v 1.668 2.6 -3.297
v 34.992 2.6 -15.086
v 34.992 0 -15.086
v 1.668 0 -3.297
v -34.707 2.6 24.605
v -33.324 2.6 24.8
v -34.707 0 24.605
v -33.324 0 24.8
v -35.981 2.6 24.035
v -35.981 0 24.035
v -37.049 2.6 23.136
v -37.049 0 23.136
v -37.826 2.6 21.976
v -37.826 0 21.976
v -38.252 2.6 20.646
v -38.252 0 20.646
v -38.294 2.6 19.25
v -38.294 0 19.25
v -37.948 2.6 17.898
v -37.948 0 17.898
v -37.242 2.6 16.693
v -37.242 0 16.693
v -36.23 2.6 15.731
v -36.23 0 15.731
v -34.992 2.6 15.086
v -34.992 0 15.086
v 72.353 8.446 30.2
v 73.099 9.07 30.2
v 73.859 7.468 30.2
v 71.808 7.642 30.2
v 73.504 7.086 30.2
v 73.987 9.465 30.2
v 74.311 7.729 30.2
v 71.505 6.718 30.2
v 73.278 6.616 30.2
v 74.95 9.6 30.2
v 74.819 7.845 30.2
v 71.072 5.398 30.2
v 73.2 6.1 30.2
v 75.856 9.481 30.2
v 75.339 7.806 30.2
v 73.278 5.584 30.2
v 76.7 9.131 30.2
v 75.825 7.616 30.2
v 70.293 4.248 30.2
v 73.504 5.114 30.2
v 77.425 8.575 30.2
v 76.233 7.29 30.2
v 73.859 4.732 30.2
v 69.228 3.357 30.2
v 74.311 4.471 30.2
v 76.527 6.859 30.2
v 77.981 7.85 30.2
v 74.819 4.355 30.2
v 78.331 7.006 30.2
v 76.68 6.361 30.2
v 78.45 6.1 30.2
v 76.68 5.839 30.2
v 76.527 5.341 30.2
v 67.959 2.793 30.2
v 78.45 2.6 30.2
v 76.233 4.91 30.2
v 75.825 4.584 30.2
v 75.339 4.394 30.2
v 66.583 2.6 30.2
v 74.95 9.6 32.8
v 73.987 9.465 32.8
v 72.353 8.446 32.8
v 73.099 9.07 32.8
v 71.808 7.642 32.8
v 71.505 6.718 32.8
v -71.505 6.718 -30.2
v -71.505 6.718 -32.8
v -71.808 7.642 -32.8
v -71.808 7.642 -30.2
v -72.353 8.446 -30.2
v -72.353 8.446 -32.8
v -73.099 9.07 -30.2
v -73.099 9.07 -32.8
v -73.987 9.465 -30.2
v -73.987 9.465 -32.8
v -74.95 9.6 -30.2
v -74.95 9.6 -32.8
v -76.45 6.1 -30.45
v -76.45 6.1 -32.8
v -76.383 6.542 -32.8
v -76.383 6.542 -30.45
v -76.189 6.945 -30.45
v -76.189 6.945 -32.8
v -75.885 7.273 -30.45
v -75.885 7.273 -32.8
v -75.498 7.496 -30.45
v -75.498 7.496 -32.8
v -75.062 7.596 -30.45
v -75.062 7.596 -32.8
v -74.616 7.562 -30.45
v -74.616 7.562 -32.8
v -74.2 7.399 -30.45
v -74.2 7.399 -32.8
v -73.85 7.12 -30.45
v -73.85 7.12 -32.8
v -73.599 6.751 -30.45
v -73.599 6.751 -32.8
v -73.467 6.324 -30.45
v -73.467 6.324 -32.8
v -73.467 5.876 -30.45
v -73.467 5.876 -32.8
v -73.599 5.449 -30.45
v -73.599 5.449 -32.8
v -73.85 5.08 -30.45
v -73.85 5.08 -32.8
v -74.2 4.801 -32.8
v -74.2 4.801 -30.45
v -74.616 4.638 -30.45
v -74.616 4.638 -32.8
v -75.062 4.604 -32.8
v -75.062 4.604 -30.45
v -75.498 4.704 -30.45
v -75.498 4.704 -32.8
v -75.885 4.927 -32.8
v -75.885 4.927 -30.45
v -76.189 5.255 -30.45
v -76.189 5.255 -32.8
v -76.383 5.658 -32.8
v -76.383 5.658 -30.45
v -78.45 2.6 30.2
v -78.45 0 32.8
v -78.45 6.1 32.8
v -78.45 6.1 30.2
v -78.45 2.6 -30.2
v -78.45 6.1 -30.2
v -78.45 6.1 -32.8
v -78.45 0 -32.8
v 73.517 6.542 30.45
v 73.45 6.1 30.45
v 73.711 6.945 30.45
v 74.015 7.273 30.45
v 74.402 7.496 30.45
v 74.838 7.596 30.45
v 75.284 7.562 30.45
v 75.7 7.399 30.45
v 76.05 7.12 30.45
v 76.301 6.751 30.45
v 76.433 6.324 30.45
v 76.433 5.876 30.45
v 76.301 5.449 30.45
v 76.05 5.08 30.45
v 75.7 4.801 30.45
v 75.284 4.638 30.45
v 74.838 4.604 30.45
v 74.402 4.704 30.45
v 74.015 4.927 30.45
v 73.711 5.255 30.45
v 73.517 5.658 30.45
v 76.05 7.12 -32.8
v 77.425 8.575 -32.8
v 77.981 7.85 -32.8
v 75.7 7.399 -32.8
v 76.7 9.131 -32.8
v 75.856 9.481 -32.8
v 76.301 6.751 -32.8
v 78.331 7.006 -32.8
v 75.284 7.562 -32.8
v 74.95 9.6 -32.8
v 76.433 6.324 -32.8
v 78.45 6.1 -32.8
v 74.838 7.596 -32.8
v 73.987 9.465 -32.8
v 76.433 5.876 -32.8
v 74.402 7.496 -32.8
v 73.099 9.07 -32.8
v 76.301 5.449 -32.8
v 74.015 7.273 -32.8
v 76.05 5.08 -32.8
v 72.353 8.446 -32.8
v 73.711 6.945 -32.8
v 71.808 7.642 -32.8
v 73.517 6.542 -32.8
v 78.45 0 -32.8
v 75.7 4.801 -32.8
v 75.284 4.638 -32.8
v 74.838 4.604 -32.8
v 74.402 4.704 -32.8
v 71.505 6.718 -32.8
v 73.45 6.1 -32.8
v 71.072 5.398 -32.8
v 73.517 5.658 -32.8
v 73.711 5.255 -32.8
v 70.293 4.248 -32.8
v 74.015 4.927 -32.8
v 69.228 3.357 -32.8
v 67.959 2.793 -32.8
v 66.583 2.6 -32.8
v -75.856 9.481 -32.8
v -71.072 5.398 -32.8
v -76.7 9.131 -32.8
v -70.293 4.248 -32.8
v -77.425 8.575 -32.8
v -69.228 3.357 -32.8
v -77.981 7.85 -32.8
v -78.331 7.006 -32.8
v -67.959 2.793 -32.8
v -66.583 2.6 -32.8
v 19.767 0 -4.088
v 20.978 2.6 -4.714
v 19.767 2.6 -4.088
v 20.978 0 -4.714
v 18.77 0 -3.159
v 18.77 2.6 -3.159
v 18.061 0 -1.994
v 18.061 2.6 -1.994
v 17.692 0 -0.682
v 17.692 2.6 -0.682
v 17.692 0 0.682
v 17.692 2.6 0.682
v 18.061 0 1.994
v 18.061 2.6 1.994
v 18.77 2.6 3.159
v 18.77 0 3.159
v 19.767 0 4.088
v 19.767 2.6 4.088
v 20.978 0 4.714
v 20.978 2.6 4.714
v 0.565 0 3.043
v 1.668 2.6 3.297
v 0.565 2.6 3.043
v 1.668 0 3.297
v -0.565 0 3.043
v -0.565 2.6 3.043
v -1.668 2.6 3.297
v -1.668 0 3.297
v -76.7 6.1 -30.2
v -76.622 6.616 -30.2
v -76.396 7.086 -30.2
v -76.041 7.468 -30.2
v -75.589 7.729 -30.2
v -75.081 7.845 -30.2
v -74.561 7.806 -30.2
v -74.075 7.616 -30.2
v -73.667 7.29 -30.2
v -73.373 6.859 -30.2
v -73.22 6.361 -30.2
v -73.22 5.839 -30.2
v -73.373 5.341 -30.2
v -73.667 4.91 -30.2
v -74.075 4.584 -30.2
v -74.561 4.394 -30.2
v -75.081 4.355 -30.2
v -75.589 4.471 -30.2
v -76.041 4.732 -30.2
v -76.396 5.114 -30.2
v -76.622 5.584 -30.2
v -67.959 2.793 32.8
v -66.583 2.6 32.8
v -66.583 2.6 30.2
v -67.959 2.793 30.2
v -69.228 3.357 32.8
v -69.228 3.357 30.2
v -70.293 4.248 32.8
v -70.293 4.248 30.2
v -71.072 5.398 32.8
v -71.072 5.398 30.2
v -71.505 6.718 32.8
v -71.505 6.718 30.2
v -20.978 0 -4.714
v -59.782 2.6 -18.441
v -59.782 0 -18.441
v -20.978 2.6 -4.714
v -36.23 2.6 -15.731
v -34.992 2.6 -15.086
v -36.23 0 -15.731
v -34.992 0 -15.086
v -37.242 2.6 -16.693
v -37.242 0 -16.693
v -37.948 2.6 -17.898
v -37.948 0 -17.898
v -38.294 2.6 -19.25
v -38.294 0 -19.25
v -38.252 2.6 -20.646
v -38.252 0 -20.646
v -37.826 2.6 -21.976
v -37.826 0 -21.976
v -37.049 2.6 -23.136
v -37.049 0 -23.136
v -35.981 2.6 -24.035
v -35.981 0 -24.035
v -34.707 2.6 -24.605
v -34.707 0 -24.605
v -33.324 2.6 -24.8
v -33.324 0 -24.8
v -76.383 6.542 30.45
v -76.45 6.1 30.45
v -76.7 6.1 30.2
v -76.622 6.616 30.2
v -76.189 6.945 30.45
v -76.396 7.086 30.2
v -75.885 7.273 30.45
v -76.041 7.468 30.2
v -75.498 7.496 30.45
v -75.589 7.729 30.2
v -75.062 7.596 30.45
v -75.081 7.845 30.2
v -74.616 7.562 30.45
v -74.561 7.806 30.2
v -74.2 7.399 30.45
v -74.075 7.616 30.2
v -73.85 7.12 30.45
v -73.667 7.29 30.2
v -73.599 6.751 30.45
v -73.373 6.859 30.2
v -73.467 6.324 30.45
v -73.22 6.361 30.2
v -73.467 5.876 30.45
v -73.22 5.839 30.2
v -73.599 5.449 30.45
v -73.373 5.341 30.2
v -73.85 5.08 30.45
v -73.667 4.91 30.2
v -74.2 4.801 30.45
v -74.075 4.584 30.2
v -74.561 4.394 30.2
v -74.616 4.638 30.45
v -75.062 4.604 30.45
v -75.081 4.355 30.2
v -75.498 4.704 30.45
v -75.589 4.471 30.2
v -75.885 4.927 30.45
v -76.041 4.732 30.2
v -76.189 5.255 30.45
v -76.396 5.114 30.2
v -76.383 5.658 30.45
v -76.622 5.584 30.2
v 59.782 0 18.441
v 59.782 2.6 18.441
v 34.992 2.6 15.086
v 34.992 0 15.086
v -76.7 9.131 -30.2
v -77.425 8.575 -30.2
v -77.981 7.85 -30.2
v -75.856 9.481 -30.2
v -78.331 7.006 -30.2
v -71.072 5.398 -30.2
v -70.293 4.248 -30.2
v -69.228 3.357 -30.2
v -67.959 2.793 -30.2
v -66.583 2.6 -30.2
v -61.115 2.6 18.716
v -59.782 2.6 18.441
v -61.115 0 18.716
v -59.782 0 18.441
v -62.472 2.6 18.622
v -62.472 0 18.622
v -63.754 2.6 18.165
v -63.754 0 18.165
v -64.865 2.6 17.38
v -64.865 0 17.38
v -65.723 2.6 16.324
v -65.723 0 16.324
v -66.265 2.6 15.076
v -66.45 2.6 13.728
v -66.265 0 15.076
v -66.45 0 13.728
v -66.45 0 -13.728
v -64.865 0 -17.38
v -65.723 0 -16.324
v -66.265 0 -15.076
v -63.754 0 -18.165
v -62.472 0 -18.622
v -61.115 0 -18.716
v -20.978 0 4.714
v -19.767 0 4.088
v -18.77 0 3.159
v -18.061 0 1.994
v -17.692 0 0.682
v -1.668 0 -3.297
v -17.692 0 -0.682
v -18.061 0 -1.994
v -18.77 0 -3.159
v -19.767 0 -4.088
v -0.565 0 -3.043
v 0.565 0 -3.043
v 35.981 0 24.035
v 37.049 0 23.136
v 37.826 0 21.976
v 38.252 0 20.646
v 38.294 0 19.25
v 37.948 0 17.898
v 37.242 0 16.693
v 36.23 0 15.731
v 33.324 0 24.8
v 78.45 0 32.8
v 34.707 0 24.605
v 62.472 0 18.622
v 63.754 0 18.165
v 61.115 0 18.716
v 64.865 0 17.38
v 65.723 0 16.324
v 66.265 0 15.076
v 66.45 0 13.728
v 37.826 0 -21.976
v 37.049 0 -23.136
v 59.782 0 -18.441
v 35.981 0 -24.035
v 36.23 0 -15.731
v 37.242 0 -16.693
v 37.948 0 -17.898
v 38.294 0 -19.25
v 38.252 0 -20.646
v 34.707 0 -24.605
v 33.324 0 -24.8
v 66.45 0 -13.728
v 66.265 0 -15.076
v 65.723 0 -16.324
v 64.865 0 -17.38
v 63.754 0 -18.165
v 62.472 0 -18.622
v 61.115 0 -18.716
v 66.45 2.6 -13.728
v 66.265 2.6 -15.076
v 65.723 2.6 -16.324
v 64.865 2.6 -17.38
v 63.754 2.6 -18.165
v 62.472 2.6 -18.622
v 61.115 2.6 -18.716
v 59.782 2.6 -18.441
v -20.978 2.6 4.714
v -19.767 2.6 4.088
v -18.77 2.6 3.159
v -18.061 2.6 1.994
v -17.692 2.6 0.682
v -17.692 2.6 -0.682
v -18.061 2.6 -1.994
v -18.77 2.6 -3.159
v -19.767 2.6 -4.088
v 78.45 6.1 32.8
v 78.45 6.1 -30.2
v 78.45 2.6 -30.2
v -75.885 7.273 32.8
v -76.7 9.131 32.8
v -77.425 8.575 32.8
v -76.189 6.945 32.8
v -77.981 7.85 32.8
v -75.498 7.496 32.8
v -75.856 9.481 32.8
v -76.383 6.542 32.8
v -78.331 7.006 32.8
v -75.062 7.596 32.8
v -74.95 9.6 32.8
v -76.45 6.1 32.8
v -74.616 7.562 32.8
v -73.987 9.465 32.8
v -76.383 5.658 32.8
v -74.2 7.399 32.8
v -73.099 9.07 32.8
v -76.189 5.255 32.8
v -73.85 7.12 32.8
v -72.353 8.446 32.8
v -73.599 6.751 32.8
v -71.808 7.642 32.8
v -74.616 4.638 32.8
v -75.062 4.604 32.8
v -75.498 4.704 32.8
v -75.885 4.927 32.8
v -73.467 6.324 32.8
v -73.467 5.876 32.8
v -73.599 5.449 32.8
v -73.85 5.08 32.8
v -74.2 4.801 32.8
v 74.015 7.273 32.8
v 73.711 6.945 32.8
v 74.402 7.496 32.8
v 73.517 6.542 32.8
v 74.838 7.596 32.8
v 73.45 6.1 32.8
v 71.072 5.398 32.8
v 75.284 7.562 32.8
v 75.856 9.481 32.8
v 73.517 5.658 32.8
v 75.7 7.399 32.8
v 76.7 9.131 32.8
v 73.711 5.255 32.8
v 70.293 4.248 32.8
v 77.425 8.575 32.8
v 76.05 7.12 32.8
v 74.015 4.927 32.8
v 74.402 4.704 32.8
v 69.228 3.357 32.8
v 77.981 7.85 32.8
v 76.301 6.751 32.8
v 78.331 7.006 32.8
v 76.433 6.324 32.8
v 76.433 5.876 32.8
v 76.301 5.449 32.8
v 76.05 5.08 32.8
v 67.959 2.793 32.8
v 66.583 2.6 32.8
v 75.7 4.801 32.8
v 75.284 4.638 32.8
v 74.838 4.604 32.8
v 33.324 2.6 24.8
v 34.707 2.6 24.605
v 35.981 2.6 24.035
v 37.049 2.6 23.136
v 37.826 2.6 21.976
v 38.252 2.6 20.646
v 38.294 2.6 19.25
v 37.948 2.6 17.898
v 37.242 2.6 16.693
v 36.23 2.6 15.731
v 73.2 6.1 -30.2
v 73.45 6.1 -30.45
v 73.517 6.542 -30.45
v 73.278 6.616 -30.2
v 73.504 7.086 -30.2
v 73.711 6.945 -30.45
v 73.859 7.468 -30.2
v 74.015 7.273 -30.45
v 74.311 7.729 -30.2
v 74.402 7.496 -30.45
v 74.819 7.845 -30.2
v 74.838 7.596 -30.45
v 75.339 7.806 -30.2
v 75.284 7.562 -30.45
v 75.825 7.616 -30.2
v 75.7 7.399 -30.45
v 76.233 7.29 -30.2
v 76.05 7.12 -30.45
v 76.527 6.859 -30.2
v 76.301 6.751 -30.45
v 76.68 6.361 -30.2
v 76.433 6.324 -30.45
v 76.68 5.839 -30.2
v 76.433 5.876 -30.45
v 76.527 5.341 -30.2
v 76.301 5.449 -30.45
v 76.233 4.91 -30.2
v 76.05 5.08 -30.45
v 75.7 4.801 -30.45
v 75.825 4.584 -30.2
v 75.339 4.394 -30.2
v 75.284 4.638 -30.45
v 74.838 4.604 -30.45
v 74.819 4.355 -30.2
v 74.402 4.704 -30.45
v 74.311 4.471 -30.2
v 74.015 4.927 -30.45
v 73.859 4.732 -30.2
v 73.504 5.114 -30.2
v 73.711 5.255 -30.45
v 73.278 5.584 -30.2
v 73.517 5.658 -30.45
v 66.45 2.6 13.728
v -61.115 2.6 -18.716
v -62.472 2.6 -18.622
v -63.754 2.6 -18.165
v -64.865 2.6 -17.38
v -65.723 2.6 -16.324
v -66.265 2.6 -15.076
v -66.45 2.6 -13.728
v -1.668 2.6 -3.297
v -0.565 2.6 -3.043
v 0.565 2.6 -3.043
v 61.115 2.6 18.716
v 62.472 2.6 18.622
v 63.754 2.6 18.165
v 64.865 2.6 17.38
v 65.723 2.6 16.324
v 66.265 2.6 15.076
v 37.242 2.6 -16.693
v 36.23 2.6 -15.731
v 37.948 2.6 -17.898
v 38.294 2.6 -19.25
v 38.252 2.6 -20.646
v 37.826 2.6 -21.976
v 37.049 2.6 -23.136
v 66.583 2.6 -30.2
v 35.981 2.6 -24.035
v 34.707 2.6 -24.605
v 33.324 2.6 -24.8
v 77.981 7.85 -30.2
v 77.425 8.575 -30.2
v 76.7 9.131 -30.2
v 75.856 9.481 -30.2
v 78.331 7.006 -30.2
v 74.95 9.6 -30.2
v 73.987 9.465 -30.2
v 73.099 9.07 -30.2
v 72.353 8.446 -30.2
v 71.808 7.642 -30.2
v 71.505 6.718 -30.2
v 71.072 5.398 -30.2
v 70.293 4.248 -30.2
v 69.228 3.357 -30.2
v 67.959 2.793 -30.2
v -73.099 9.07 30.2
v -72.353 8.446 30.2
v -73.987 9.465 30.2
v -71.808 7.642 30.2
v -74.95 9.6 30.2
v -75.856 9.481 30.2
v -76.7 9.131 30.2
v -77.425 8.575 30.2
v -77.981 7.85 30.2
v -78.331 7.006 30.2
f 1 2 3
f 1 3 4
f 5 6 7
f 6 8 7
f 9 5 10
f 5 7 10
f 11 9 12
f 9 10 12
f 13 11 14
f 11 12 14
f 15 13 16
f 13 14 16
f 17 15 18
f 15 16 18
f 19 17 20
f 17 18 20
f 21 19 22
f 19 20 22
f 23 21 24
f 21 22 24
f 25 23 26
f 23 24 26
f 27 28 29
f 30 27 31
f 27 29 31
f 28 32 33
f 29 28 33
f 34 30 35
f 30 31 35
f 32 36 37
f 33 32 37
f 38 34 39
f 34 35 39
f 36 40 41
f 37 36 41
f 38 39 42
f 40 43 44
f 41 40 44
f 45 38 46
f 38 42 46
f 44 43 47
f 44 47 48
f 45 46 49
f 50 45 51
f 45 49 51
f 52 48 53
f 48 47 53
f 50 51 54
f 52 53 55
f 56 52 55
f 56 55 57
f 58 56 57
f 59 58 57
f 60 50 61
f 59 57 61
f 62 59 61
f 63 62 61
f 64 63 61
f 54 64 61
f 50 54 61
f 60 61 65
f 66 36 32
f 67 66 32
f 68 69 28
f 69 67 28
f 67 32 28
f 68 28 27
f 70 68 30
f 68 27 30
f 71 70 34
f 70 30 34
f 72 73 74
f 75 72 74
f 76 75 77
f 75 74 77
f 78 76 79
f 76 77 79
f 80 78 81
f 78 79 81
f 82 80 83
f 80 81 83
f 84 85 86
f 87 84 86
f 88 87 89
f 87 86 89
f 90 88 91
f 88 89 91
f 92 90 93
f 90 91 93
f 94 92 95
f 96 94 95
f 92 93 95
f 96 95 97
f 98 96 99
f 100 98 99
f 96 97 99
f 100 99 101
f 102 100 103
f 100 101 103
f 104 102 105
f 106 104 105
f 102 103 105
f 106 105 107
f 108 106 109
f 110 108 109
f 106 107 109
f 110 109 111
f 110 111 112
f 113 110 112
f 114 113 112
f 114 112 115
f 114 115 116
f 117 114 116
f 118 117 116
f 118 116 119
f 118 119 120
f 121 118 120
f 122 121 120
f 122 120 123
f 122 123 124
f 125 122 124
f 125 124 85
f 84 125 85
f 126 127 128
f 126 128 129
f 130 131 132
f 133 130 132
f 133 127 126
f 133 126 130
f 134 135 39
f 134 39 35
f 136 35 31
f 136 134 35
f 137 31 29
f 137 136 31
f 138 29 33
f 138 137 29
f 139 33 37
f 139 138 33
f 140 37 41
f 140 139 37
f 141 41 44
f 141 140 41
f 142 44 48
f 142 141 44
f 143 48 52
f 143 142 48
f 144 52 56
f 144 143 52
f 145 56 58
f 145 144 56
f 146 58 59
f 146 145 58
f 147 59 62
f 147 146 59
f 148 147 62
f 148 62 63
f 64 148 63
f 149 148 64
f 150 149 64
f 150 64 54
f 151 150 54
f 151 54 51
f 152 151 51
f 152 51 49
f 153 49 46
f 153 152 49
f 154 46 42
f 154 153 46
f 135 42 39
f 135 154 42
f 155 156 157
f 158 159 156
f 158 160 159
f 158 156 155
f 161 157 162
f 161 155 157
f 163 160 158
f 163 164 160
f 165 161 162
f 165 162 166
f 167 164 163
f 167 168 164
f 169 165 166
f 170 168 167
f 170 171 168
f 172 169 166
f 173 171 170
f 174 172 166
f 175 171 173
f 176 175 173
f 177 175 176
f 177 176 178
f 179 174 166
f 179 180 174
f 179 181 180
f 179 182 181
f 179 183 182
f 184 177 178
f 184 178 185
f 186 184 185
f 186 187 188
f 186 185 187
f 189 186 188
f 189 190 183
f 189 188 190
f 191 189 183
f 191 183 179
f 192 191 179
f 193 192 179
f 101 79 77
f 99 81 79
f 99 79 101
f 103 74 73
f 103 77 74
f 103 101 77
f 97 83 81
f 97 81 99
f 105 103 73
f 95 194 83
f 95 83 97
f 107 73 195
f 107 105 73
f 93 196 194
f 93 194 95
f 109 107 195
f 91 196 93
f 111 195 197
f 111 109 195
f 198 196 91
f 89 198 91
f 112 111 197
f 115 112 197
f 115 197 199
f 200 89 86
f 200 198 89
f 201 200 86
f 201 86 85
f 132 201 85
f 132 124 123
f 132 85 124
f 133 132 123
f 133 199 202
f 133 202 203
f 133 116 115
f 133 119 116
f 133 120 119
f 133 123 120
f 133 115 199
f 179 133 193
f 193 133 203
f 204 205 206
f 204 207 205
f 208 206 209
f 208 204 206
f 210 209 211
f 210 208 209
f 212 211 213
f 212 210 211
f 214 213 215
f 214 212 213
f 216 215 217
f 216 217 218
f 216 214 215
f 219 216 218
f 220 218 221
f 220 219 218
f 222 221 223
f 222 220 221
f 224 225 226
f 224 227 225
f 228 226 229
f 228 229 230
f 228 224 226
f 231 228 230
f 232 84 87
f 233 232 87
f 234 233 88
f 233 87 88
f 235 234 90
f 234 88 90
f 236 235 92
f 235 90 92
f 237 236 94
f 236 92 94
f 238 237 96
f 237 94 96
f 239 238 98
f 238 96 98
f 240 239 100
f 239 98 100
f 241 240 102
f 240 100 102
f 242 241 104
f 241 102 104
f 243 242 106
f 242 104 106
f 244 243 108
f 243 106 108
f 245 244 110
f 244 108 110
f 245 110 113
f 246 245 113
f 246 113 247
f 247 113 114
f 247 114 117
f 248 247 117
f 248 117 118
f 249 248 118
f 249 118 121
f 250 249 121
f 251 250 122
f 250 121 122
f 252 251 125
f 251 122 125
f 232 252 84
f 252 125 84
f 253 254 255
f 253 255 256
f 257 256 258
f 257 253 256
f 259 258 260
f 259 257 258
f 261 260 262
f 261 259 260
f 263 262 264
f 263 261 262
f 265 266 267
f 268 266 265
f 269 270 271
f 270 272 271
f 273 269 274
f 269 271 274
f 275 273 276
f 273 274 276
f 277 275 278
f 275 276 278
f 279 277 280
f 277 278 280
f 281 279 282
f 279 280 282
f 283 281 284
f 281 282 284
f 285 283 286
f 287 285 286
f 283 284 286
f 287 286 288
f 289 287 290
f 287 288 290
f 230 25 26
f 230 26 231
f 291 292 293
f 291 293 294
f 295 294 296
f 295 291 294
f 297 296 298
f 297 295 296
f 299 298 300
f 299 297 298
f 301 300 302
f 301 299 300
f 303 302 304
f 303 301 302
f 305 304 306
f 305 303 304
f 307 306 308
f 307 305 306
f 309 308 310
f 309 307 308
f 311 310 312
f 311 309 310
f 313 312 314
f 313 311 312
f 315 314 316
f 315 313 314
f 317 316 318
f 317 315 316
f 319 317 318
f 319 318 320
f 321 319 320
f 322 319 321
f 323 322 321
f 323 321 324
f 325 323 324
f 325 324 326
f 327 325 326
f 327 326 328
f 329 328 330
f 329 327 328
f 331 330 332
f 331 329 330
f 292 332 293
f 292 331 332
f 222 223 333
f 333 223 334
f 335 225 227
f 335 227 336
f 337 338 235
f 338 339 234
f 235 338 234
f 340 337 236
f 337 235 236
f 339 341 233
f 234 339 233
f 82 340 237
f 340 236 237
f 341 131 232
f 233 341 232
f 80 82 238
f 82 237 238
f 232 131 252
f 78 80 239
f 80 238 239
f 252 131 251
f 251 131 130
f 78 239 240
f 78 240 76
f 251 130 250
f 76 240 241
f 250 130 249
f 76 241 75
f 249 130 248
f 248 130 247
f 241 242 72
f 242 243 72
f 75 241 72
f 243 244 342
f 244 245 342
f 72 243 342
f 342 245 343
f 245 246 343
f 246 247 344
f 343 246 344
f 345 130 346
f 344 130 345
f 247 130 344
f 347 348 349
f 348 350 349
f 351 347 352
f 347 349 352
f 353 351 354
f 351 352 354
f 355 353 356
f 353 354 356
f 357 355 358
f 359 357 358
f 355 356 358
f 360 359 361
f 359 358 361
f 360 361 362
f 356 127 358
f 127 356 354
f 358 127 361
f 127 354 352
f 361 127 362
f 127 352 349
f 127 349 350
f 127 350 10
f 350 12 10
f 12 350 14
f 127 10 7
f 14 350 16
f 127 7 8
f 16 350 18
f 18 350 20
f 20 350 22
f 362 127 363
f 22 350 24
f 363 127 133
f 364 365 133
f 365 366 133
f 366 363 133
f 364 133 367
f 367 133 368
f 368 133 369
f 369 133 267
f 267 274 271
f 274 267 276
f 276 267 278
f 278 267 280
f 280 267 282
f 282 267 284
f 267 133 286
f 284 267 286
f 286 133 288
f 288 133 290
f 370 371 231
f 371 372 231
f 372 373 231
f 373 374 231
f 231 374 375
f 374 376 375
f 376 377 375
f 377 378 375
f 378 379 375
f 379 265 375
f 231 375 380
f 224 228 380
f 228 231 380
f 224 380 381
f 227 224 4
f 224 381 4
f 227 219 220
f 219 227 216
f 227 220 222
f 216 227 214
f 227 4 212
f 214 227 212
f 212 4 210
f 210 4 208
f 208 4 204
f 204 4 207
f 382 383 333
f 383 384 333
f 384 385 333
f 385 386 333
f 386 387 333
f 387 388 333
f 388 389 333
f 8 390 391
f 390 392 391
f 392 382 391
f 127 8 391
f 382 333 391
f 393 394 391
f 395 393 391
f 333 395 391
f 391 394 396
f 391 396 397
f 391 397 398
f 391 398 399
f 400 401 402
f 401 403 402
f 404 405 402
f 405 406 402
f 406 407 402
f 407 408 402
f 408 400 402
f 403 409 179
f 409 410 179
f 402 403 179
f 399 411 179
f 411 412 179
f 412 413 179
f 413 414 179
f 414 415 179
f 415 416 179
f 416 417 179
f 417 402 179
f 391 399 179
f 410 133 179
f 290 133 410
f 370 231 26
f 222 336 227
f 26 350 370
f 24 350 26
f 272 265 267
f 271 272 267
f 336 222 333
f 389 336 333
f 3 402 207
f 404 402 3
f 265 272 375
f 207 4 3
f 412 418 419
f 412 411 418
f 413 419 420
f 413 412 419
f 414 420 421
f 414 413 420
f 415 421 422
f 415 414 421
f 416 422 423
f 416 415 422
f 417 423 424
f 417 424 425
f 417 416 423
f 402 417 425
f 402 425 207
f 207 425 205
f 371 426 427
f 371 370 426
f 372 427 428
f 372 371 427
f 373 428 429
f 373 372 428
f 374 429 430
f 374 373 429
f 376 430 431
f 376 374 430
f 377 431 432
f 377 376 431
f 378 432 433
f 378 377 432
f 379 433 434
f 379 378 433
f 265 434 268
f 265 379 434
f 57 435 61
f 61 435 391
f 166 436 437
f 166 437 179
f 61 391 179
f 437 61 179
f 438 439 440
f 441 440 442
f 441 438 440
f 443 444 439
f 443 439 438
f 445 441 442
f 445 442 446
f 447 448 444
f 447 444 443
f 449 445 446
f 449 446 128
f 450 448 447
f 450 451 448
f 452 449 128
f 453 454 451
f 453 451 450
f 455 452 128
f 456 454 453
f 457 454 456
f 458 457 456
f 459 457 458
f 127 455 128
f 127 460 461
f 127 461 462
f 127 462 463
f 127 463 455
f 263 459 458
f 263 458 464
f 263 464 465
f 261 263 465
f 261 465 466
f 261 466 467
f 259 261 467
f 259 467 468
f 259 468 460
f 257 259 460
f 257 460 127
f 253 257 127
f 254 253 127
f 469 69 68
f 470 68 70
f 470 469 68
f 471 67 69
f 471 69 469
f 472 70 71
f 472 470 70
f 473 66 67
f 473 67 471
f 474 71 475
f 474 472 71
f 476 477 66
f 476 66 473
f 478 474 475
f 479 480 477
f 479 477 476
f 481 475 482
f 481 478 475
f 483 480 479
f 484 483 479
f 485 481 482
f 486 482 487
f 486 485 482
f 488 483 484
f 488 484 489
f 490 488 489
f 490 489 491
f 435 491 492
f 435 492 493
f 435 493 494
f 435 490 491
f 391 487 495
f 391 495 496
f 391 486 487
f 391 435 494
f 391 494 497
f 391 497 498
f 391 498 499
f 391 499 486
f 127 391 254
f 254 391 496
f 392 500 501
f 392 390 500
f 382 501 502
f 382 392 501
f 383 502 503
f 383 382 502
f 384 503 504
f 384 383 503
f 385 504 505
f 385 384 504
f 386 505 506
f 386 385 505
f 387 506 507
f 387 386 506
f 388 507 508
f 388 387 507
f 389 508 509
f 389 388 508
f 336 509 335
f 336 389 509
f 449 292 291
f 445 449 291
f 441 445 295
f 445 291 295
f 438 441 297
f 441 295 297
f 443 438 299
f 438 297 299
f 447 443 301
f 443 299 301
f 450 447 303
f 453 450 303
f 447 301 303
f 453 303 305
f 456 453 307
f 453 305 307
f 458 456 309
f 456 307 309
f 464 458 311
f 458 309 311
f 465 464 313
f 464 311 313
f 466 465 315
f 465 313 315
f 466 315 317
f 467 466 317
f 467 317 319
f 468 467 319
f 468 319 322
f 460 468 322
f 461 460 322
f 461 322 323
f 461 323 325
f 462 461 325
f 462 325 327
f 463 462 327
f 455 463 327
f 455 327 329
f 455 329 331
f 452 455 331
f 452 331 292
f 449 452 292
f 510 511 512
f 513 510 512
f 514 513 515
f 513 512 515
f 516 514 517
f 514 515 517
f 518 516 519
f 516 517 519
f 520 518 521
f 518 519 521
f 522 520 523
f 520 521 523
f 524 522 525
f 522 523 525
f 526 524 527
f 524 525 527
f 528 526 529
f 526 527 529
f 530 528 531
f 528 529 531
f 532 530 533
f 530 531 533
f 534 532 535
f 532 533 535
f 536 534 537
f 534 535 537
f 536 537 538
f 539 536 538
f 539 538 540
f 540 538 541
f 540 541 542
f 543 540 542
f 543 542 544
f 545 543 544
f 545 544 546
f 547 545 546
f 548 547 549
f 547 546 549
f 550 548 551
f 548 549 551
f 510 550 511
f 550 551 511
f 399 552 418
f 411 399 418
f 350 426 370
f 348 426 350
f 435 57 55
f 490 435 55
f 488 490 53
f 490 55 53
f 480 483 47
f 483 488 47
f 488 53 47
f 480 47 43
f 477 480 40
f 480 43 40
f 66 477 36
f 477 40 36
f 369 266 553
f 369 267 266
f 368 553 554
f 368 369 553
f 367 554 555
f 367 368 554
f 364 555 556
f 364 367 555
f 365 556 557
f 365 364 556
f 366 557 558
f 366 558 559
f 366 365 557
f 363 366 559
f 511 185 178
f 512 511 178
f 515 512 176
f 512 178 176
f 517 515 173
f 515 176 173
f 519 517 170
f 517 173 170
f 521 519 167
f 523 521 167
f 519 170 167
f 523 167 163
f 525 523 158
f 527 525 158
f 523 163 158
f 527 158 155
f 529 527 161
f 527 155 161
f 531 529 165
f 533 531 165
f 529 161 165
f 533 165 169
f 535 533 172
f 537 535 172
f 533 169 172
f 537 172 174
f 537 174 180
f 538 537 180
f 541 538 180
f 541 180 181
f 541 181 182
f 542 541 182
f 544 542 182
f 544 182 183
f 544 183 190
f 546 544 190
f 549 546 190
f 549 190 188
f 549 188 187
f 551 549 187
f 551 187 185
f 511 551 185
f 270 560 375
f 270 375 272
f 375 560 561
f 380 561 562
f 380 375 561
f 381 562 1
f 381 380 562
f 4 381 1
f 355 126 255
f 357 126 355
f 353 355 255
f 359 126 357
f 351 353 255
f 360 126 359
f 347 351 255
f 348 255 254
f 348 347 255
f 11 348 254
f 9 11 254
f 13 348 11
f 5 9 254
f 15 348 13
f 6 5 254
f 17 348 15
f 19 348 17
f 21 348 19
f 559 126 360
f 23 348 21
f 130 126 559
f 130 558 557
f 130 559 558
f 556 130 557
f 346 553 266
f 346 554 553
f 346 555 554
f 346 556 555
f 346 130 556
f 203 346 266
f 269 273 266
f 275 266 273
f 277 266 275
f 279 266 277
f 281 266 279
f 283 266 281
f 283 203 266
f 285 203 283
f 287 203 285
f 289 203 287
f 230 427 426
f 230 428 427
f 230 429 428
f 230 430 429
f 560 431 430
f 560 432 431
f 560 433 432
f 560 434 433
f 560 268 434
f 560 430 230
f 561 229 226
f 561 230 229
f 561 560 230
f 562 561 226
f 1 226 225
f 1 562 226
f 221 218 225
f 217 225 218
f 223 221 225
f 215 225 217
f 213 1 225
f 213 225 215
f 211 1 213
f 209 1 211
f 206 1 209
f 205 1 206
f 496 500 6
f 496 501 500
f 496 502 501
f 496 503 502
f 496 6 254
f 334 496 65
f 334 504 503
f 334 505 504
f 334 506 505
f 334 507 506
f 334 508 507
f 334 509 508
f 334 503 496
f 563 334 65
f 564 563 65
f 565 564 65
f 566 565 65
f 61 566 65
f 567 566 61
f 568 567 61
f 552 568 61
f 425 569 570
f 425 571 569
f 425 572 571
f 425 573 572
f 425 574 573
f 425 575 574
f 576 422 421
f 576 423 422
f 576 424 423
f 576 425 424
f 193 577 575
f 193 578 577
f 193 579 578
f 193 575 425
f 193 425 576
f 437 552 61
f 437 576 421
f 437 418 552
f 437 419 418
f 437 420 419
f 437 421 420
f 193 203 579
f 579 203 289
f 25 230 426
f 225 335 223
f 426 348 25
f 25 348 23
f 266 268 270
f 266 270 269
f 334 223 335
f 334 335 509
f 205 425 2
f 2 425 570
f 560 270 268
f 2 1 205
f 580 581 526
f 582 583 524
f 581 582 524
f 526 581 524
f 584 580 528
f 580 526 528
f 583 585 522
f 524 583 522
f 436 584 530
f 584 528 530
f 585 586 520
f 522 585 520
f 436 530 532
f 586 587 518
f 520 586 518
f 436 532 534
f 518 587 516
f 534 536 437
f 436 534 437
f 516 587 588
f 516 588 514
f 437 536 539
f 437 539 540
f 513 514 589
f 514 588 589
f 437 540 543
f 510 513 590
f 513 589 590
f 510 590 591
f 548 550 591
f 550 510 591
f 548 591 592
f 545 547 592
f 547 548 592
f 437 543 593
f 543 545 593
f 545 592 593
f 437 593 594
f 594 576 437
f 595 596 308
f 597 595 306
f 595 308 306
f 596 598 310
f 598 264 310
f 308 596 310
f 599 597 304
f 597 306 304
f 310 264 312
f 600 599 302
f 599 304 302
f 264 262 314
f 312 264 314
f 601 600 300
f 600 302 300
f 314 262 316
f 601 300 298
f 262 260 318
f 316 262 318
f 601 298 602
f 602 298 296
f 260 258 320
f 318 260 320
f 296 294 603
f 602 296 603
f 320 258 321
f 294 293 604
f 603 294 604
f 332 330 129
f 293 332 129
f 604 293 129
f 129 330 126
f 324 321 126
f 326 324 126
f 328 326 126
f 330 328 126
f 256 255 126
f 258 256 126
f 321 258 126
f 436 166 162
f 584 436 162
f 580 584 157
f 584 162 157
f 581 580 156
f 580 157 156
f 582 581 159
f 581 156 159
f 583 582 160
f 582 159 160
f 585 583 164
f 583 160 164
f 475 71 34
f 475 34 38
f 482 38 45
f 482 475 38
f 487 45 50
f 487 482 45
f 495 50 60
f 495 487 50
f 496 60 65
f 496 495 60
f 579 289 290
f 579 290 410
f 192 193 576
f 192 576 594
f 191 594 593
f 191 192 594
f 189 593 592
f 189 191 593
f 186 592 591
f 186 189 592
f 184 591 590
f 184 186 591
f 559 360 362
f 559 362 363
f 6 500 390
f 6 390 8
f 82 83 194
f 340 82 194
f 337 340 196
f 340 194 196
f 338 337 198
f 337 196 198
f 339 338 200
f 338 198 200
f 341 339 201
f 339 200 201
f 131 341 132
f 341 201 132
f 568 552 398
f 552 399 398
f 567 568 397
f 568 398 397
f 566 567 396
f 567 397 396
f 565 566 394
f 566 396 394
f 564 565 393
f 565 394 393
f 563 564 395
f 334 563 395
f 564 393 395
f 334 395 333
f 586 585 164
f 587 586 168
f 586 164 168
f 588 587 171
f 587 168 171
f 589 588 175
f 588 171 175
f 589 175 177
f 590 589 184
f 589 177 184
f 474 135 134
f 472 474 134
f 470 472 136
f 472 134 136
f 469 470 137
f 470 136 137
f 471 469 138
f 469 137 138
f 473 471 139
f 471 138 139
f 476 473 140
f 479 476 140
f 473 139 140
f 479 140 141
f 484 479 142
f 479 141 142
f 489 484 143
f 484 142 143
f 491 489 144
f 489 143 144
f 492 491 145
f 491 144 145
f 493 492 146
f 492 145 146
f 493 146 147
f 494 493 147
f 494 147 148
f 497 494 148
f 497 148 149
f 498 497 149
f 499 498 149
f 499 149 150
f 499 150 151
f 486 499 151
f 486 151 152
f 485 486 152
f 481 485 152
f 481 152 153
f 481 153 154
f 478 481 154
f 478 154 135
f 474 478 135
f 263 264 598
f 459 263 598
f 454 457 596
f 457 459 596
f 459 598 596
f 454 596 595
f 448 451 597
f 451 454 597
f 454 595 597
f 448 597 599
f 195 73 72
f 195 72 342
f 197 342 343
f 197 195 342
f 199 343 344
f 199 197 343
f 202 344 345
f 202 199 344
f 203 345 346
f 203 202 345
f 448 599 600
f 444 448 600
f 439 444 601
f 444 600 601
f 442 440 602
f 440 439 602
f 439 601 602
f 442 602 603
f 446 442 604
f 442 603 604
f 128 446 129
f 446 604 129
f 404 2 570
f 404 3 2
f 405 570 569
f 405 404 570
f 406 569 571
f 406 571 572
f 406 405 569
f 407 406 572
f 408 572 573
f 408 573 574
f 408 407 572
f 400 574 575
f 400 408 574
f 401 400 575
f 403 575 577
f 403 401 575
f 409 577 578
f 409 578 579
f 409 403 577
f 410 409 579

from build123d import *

# Parameters (mm, degrees)
SKETCH1_W           = 156.9
SKETCH1_H           = 65.6
BOSS_EXTRUDE1_DEPTH = 2.6
SKETCH2_W           = 7
SKETCH2_H           = 2.6
BOSS_EXTRUDE2_DEPTH = 7
SKETCH3_R           = 1.49999999
CUT_EXTRUDE1_DEPTH  = 103.712815656
FILLET1_R           = 5
CUT_EXTRUDE2_DEPTH  = 3.5
FILLET3_R           = 5
CHAMFER1_SIZE       = 0.25


with BuildPart() as part:
    # Sketch1 → Boss-Extrude1 (new body)
    with BuildSketch(Plane(origin=(0, 0, 0), x_dir=(1, 0, 0), z_dir=(0, 1, 0))):
        Rectangle(SKETCH1_W, SKETCH1_H)
    extrude(amount=BOSS_EXTRUDE1_DEPTH)

    # Sketch2 → Boss-Extrude2 (add)
    with BuildSketch(Plane(origin=(0, 2.6, 0), x_dir=(1, 0, 0), z_dir=(0, 1, 0))):
        with Locations((-74.95, 31.5)):
            Rectangle(SKETCH2_W, SKETCH2_H)
        with Locations((-74.95, -31.5)):
            Rectangle(SKETCH2_W, SKETCH2_H)
        with Locations((74.95, -31.5)):
            Rectangle(SKETCH2_W, SKETCH2_H)
        with Locations((74.95, 31.5)):
            Rectangle(SKETCH2_W, SKETCH2_H)
    extrude(amount=BOSS_EXTRUDE2_DEPTH)

    # Sketch3 → Cut-Extrude1 (cut, through all)
    with BuildSketch(Plane(origin=(0, 0, -32.8), x_dir=(-1, 0, 0), z_dir=(0, 0, -1))):
        with BuildLine():
            Line((-78.45, 9.6), (-78.45, 6.1))
            ThreePointArc((-78.45, 6.1), (-77.424873734, 8.574873734), (-74.95, 9.6))
            Line((-74.95, 9.6), (-78.45, 9.6))
        make_face()
        with BuildLine():
            Line((-71.45, 9.6), (-74.95, 9.6))
            ThreePointArc((-74.95, 9.6), (-72.475126266, 8.574873734), (-71.45, 6.1))
            Line((-71.45, 6.1), (-71.45, 9.6))
        make_face()
        with Locations((74.95, 6.1)):
            Circle(SKETCH3_R)
        with BuildLine():
            Line((74.95, 9.6), (71.45, 9.6))
            Line((71.45, 9.6), (71.45, 6.1))
            ThreePointArc((71.45, 6.1), (72.475126266, 8.574873734), (74.95, 9.6))
        make_face()
        with BuildLine():
            Line((78.45, 9.6), (74.95, 9.6))
            ThreePointArc((74.95, 9.6), (77.424873734, 8.574873734), (78.45, 6.1))
            Line((78.45, 6.1), (78.45, 9.6))
        make_face()
        with Locations((-74.95, 6.1)):
            Circle(SKETCH3_R)
    extrude(amount=-CUT_EXTRUDE1_DEPTH, mode=Mode.SUBTRACT)

    # Fillet1
    # the kernel refuses this fillet: 5 mm, written as the material it adds along each edge
    with BuildSketch(Plane(origin=(-71.45, 2.6, 32.8), x_dir=(1, 0, 0), z_dir=(0, 0, -1))) as fillet1_piece_1:
        with BuildLine():
            CenterArc((4.866600265, -5), FILLET1_R, 90, 79.835751378)
            Line((-0.054929303, -4.117647059), (-0.547082259, -4.029411765))
            ThreePointArc((-0.547082259, -4.029411765), (-0.5, -3.5), (-0.5, 0))
            Line((-0.5, 0), (0, 0.5))
            Line((0, 0.5), (4.866600265, 0.5))
            Line((4.866600265, 0.5), (4.866600265, 0))
        make_face()
    extrude(amount=2.6)
    with BuildSketch(Plane(origin=(71.45, 2.6, 32.8), x_dir=(0.01333878666755776, 0.9999110344276821, 0), z_dir=(0, 0, -1)), Plane(origin=(-71.45, 2.6, -32.8), x_dir=(-0.013338786667550865, 0.9999110344276821, 0), z_dir=(0, 0, 1))) as fillet1_piece_2:
        with BuildLine():
            CenterArc((4.934640629, -4.932861239), FILLET1_R, 99.399969777, 79.835751378)
            Line((-0.064914543, -4.866167305), (-0.56487006, -4.859497912))
            Line((-0.56487006, -4.859497912), (-0.499955517, 0.006669393))
            Line((-0.499955517, 0.006669393), (0.006669393, 0.499955517))
            ThreePointArc((0.006669393, 0.499955517), (3.506358014, 0.453269764), (4.036350699, 0.493286124))
            Line((4.036350699, 0.493286124), (4.11801342, 0))
        make_face()
    extrude(amount=2.6)
    with BuildSketch(Plane(origin=(71.45, 2.6, -32.8), x_dir=(0.01333878666755776, 0.9999110344276821, 0), z_dir=(0, 0, 1))) as fillet1_piece_3:
        with BuildLine():
            CenterArc((4.934640629, 4.932861239), FILLET1_R, 180.764278845, 79.835751378)
            Line((-0.064914543, 4.866167305), (-0.56487006, 4.859497912))
            Line((-0.56487006, 4.859497912), (-0.499955517, -0.006669393))
            Line((-0.499955517, -0.006669393), (0.006669393, -0.499955517))
            ThreePointArc((0.006669393, -0.499955517), (3.506358014, -0.453269764), (4.036350699, -0.493286124))
            Line((4.036350699, -0.493286124), (4.11801342, 0))
        make_face()
    extrude(amount=2.6)

    # Sketch4 → Cut-Extrude2 (cut)
    with BuildSketch(Plane(origin=(0, 2.6, 0), x_dir=(1, 0, 0), z_dir=(0, 1, 0))):
        Polygon((-62.45, -24.8), (0, -2.707525213), (62.45, -24.8), align=None)
        Polygon((-66.45, -20.8), (-66.45, 20.8), (-7.653508772, 0), align=None)
        Polygon((66.45, -20.8), (66.45, 20.8), (7.653508772, 0), align=None)
        Polygon((-62.45, 24.8), (62.45, 24.8), (0, 2.707525213), align=None)
    extrude(amount=-CUT_EXTRUDE2_DEPTH, mode=Mode.SUBTRACT)

    # Fillet3
    fillet3_edges = [part.edges().sort_by_distance(p)[0] for p in [
        (0, 1.3, -2.707525213),
        (-62.45, 1.3, -24.8),
        (62.45, 1.3, -24.8),
        (-7.653508772, 1.3, 0),
        (-66.45, 1.3, 20.8),
        (-66.45, 1.3, -20.8),
        (66.45, 1.3, 20.8),
        (7.653508772, 1.3, 0),
        (66.45, 1.3, -20.8),
        (62.45, 1.3, 24.8),
        (-62.45, 1.3, 24.8),
        (0, 1.3, 2.707525213),
    ]]
    fillet(fillet3_edges, radius=FILLET3_R)

    # Chamfer1
    chamfer1_edges = [part.edges().sort_by_distance(p)[0] for p in [
        (-73.45000001, 6.1, -30.2),
        (-73.45000001, 6.1, 30.2),
        (76.44999999, 6.1, 30.2),
        (76.44999999, 6.1, -30.2),
    ]]
    chamfer(chamfer1_edges, length=CHAMFER1_SIZE)


solid = part.part
